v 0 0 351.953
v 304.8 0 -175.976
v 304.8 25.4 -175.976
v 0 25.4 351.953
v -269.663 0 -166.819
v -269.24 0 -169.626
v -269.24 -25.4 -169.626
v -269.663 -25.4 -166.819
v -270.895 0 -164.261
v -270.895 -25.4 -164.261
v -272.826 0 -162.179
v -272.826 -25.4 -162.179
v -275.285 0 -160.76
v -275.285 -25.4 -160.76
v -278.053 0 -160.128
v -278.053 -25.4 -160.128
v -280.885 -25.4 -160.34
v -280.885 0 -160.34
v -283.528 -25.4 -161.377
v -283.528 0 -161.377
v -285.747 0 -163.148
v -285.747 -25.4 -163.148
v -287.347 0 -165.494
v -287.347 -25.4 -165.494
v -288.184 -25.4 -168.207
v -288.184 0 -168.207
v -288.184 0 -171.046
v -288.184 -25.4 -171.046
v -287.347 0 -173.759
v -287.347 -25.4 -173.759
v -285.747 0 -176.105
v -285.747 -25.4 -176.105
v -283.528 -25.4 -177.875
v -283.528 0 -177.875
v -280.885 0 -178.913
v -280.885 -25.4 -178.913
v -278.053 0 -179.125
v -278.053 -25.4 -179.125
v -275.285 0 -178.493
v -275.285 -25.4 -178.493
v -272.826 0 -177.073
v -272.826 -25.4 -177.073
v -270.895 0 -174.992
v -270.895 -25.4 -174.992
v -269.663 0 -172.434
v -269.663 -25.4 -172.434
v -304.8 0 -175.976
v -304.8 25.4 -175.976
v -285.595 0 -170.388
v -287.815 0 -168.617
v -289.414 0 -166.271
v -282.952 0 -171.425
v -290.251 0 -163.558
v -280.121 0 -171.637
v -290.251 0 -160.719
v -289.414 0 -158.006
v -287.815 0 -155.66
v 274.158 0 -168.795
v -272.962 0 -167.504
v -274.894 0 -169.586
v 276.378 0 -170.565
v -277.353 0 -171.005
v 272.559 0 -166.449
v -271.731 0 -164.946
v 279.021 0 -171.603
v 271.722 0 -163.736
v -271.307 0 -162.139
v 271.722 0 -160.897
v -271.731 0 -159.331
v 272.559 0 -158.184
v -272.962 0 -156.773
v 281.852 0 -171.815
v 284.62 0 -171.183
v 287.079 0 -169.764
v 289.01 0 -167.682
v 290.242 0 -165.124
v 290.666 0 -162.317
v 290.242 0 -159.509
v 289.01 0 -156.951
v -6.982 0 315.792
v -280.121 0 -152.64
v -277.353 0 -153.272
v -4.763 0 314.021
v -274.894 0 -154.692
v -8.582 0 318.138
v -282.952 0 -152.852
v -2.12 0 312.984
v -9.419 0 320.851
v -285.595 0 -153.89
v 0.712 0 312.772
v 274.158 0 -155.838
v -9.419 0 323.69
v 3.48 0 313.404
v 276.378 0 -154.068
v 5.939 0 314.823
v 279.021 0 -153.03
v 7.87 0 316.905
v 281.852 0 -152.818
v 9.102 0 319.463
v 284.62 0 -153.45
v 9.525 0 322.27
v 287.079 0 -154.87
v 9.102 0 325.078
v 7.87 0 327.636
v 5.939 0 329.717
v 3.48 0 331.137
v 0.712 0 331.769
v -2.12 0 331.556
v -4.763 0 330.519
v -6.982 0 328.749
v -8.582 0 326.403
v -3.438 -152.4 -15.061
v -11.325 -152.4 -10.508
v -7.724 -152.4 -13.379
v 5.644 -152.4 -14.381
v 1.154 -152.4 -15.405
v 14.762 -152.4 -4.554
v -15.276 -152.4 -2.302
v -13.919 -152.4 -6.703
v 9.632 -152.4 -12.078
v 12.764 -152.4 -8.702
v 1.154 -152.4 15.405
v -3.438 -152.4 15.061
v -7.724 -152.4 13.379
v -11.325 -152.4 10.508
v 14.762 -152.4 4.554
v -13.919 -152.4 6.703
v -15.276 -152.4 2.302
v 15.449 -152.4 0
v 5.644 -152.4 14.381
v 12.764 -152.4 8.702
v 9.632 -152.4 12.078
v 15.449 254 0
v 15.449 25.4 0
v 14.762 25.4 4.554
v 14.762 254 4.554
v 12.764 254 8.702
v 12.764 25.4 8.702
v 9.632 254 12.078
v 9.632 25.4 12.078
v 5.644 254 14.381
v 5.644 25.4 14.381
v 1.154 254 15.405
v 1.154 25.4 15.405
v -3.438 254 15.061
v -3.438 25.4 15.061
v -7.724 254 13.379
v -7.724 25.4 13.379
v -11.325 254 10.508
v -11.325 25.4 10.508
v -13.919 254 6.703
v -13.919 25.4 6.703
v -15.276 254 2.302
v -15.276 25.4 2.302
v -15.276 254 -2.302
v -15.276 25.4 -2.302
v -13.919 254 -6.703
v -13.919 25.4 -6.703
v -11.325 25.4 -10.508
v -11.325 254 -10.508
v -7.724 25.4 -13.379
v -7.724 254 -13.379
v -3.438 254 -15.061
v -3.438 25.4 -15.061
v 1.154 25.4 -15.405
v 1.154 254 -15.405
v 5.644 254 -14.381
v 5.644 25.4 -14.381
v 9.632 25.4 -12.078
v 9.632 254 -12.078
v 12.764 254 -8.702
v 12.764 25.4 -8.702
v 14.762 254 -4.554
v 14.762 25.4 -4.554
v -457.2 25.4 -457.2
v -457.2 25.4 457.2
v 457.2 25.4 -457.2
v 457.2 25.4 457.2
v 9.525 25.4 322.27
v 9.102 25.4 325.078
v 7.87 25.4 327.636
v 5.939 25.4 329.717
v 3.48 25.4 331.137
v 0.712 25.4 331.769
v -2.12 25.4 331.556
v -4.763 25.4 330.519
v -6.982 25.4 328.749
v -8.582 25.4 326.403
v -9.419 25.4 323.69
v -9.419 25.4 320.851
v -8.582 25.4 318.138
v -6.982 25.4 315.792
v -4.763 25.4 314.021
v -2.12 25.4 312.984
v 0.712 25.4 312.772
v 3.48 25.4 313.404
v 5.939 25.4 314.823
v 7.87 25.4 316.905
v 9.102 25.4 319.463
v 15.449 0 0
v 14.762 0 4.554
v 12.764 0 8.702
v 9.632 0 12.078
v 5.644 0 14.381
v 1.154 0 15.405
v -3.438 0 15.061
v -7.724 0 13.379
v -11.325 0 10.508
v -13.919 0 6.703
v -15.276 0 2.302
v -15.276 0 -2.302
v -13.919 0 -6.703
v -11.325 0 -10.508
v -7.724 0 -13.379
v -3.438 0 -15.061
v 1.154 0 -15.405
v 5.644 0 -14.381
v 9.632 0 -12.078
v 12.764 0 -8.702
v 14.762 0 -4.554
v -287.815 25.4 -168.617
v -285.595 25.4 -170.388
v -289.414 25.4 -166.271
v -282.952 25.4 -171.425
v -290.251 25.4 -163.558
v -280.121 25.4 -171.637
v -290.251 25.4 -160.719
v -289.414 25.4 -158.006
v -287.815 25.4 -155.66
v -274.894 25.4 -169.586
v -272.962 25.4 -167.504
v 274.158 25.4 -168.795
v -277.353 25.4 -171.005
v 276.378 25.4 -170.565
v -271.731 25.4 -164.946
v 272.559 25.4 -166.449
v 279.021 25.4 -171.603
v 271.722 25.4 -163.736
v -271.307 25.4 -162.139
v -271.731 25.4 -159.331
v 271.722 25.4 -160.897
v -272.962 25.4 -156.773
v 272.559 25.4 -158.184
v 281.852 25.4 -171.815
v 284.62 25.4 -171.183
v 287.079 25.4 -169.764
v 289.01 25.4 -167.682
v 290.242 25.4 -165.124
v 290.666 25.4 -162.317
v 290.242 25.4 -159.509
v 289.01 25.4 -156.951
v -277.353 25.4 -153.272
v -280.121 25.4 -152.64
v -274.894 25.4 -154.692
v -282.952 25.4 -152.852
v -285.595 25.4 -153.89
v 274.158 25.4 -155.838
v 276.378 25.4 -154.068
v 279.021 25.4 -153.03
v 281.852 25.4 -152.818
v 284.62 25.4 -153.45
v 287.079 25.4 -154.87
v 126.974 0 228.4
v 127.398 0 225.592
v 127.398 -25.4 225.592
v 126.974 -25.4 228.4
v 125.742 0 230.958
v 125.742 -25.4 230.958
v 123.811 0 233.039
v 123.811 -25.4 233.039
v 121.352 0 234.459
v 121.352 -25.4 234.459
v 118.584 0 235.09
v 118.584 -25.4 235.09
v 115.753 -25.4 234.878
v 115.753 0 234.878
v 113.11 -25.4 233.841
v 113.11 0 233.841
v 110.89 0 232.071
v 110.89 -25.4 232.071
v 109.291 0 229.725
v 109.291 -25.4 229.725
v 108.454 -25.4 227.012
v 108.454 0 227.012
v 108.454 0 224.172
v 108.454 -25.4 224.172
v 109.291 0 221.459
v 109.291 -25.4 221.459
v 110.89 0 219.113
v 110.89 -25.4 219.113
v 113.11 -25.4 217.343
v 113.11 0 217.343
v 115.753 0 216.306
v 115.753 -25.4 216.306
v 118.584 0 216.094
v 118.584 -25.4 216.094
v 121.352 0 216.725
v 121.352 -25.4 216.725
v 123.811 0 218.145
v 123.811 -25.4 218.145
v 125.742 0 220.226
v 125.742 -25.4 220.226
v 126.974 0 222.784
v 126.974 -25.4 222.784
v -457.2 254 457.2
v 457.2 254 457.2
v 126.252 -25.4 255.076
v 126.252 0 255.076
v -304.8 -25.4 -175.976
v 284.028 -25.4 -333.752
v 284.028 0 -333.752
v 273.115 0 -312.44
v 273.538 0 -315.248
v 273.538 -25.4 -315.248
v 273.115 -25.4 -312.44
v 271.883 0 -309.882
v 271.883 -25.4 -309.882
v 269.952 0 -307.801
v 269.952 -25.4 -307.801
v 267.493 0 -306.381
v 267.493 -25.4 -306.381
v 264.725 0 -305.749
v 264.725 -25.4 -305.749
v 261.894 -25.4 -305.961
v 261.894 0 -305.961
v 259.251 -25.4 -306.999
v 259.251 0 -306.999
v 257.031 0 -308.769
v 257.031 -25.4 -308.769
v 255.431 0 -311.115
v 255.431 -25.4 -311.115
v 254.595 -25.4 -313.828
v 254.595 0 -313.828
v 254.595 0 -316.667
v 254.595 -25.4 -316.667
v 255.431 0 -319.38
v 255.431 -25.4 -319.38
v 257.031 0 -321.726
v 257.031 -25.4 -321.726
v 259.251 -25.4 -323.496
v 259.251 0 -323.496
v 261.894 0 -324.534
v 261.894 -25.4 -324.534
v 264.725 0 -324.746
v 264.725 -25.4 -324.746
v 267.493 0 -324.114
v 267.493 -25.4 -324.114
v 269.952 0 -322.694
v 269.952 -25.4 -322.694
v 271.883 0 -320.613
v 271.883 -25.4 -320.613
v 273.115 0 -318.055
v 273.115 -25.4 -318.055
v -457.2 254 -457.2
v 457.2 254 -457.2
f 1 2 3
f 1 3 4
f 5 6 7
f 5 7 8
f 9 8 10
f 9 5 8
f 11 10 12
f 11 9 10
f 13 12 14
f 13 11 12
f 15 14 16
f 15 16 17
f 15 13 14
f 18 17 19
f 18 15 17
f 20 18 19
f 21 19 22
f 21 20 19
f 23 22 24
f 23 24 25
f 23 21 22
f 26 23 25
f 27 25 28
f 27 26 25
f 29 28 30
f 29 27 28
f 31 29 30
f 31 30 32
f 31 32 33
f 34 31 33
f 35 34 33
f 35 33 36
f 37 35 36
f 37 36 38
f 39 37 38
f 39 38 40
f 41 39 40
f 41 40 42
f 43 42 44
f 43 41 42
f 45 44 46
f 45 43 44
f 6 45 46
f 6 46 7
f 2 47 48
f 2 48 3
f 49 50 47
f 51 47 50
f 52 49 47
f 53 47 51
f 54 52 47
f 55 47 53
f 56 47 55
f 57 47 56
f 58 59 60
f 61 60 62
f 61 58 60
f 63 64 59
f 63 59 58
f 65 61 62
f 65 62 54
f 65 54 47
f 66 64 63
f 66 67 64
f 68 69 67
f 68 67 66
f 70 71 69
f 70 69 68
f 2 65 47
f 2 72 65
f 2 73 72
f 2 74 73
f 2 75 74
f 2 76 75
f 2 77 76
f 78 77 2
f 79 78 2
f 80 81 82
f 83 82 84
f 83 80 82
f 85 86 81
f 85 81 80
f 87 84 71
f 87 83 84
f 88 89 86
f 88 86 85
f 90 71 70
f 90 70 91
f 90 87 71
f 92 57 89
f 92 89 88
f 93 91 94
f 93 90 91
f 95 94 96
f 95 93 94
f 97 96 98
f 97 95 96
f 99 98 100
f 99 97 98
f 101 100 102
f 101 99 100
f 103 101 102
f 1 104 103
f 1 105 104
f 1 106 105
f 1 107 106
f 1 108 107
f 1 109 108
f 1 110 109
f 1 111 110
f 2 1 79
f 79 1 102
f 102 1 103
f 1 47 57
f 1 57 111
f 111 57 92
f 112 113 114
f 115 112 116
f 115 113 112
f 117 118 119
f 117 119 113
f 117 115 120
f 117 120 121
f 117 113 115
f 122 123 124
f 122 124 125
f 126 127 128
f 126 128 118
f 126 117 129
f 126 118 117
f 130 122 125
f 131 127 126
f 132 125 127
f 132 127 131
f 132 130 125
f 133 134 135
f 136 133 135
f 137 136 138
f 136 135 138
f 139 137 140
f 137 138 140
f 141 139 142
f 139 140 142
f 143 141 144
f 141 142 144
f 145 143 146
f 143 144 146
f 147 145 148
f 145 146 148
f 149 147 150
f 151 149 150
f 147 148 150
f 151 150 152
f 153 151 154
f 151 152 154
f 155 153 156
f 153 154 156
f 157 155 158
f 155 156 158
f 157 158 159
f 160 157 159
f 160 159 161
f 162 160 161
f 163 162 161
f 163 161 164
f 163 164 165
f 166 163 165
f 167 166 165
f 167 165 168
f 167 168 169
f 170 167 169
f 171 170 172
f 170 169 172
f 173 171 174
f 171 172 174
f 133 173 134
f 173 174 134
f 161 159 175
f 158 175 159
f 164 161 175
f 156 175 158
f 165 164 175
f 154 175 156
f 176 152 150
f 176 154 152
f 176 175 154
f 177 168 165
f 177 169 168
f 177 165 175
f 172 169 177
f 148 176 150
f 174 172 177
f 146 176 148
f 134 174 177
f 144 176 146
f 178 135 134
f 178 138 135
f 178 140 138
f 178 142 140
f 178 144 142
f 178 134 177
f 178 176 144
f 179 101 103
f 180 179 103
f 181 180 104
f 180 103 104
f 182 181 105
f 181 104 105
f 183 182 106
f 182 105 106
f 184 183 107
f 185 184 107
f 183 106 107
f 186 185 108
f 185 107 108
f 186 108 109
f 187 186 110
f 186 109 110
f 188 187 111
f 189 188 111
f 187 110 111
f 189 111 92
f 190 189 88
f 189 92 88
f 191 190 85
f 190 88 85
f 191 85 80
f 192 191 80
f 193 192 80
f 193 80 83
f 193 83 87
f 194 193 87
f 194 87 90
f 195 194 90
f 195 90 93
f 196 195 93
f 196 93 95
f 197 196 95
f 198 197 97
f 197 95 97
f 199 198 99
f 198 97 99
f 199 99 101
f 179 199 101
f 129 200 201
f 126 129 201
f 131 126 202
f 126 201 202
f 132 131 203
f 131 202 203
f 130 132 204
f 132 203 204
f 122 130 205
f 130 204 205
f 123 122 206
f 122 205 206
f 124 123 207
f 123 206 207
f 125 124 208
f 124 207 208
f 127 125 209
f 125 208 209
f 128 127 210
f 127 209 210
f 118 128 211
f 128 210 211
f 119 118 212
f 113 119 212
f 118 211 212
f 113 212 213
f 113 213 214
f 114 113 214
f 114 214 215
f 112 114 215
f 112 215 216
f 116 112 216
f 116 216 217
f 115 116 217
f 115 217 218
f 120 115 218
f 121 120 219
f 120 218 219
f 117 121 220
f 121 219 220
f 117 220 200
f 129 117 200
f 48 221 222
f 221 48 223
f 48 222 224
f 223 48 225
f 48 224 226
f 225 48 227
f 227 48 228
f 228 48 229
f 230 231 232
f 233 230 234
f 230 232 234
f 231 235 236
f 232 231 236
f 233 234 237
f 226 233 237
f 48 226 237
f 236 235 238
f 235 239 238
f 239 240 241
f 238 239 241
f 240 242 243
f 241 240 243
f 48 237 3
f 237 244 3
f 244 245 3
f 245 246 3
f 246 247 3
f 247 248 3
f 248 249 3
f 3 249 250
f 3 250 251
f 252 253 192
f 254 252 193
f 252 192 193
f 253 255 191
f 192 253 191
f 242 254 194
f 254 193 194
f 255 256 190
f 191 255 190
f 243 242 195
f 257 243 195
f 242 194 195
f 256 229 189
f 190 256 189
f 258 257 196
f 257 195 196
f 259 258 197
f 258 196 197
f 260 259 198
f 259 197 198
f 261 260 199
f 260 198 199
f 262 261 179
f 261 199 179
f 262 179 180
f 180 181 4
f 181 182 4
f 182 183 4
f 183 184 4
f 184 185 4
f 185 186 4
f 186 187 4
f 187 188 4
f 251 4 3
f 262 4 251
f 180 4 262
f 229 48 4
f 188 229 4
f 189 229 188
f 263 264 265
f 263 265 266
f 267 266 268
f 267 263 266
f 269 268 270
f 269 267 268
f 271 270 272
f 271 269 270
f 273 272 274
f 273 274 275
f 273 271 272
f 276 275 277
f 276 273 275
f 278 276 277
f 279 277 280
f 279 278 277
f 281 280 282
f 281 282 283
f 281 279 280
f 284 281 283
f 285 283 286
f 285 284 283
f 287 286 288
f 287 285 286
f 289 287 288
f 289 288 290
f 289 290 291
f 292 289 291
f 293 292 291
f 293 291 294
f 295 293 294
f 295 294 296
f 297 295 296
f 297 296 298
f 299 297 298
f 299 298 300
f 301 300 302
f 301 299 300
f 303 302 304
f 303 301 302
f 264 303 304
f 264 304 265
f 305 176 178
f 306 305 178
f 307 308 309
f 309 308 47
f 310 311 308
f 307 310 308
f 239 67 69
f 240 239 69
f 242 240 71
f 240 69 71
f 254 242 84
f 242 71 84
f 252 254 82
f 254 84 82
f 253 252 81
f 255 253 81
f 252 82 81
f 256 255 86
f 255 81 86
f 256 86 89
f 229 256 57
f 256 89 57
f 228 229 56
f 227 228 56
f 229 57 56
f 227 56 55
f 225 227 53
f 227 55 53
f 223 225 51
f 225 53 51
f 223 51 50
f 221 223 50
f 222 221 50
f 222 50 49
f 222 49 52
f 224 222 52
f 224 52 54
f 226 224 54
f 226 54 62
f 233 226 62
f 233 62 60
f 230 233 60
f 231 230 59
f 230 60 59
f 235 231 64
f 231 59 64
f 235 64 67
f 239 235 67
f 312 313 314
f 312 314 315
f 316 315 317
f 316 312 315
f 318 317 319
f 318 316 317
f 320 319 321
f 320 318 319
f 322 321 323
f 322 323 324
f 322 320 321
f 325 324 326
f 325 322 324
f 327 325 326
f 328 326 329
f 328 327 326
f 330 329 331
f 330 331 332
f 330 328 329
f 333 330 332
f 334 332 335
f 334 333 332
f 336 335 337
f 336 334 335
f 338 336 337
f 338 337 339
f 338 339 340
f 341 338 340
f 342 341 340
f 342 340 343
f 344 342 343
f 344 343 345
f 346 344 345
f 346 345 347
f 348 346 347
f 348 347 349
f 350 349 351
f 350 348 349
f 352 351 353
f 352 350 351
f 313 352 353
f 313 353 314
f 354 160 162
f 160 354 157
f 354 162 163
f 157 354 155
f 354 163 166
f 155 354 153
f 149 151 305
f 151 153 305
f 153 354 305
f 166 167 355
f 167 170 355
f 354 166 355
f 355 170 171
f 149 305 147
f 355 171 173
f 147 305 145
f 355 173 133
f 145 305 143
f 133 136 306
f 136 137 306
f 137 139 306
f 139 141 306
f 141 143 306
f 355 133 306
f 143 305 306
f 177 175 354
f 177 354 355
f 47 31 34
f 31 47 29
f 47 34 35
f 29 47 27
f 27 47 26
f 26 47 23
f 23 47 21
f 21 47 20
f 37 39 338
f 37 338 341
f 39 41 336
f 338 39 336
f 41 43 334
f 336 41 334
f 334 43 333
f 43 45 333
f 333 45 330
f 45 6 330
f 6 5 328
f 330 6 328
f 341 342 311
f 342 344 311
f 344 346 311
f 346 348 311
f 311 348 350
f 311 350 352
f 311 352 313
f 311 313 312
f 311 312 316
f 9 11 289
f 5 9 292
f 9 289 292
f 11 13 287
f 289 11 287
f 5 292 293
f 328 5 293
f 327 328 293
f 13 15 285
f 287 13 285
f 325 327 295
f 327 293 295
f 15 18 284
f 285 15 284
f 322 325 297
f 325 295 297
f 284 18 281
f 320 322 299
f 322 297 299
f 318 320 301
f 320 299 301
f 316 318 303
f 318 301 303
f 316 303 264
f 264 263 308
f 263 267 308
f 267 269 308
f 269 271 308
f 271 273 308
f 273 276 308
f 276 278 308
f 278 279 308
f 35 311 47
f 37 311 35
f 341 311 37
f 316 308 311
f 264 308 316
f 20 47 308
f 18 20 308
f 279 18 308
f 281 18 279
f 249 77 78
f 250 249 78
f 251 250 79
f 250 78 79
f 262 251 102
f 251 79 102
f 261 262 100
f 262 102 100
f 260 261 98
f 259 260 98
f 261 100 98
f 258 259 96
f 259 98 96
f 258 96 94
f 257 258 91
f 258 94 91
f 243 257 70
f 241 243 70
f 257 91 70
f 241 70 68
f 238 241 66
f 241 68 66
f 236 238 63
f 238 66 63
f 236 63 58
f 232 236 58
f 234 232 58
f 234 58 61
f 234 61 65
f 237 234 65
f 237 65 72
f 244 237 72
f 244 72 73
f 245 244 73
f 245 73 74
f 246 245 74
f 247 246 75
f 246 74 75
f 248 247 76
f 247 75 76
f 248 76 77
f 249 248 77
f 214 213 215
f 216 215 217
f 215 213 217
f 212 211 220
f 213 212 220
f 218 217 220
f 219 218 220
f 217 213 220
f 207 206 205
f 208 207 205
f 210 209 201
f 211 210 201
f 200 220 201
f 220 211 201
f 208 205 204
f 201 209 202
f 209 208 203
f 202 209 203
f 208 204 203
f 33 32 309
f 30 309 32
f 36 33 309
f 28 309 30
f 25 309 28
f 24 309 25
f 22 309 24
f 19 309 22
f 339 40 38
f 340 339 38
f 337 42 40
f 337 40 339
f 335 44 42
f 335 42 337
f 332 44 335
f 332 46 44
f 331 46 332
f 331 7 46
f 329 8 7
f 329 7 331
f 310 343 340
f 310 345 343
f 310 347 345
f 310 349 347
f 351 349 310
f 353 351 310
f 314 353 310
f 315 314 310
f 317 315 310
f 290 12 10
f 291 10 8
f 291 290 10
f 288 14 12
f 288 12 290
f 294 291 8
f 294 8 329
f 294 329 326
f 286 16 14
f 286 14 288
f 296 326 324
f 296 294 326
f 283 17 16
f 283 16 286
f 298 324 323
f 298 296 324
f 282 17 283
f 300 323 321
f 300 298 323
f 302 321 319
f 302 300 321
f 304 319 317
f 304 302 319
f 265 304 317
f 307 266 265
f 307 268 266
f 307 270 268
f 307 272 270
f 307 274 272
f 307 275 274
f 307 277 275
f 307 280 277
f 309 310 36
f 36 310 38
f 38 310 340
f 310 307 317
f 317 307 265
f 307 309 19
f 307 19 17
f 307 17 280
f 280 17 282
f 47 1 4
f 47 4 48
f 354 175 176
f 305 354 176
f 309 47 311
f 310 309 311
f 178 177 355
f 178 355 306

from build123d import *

# Parameters (mm, degrees)
F0_R     = 9.525
F2_DEPTH = 25.4
F1_R     = 9.525
F3_DEPTH = 25.4
F5_START = -25.4
F4_W     = 914.4
F4_H     = 914.4
F4_R     = 15.448541342
F5_DEPTH = 228.6
F6_DEPTH = 152.4


with BuildPart() as f2:
    # F0 (on Front) → F2 (new body)
    with BuildSketch(Plane.XZ):
        Polygon((-304.8, -175.976362049), (304.8, -175.976362049), (0, 351.952724098), align=None)
        with Locations((-280.8323993128, -162.1386613404)):
            Circle(F0_R, mode=Mode.SUBTRACT)
        with Locations((281.140565359, -162.3165810902)):
            Circle(F0_R, mode=Mode.SUBTRACT)
        with Locations((0, 322.2702741623)):
            Circle(F0_R, mode=Mode.SUBTRACT)
    extrude(amount=-F2_DEPTH)


with BuildPart() as f3:
    # F1 (on face) → F3 (new body)
    with BuildSketch(Plane.XZ):
        Polygon((-304.8, -175.976362049), (284.0283837058, -333.7524519435), (126.2522938113, 255.0759317623), align=None)
        with Locations((-278.7650227547, -169.6263700724)):
            Circle(F1_R, mode=Mode.SUBTRACT)
        with Locations((264.0131284784, -315.2475334434)):
            Circle(F1_R, mode=Mode.SUBTRACT)
        with Locations((117.8725027263, 225.5919577909)):
            Circle(F1_R, mode=Mode.SUBTRACT)
    extrude(amount=F3_DEPTH)


with BuildPart() as f5:
    # F4 (on Front) → F5 (new body)
    with BuildSketch(Plane.XZ.offset(F5_START)):
        Rectangle(F4_W, F4_H)
        Circle(F4_R, mode=Mode.SUBTRACT)
    extrude(amount=-F5_DEPTH)


with BuildPart() as f6:
    # F4 (on Front) → F6 (new body)
    with BuildSketch(Plane.XZ):
        Circle(F4_R)
    extrude(amount=F6_DEPTH)


solid = Compound([f2.part, f3.part, f5.part, f6.part])
